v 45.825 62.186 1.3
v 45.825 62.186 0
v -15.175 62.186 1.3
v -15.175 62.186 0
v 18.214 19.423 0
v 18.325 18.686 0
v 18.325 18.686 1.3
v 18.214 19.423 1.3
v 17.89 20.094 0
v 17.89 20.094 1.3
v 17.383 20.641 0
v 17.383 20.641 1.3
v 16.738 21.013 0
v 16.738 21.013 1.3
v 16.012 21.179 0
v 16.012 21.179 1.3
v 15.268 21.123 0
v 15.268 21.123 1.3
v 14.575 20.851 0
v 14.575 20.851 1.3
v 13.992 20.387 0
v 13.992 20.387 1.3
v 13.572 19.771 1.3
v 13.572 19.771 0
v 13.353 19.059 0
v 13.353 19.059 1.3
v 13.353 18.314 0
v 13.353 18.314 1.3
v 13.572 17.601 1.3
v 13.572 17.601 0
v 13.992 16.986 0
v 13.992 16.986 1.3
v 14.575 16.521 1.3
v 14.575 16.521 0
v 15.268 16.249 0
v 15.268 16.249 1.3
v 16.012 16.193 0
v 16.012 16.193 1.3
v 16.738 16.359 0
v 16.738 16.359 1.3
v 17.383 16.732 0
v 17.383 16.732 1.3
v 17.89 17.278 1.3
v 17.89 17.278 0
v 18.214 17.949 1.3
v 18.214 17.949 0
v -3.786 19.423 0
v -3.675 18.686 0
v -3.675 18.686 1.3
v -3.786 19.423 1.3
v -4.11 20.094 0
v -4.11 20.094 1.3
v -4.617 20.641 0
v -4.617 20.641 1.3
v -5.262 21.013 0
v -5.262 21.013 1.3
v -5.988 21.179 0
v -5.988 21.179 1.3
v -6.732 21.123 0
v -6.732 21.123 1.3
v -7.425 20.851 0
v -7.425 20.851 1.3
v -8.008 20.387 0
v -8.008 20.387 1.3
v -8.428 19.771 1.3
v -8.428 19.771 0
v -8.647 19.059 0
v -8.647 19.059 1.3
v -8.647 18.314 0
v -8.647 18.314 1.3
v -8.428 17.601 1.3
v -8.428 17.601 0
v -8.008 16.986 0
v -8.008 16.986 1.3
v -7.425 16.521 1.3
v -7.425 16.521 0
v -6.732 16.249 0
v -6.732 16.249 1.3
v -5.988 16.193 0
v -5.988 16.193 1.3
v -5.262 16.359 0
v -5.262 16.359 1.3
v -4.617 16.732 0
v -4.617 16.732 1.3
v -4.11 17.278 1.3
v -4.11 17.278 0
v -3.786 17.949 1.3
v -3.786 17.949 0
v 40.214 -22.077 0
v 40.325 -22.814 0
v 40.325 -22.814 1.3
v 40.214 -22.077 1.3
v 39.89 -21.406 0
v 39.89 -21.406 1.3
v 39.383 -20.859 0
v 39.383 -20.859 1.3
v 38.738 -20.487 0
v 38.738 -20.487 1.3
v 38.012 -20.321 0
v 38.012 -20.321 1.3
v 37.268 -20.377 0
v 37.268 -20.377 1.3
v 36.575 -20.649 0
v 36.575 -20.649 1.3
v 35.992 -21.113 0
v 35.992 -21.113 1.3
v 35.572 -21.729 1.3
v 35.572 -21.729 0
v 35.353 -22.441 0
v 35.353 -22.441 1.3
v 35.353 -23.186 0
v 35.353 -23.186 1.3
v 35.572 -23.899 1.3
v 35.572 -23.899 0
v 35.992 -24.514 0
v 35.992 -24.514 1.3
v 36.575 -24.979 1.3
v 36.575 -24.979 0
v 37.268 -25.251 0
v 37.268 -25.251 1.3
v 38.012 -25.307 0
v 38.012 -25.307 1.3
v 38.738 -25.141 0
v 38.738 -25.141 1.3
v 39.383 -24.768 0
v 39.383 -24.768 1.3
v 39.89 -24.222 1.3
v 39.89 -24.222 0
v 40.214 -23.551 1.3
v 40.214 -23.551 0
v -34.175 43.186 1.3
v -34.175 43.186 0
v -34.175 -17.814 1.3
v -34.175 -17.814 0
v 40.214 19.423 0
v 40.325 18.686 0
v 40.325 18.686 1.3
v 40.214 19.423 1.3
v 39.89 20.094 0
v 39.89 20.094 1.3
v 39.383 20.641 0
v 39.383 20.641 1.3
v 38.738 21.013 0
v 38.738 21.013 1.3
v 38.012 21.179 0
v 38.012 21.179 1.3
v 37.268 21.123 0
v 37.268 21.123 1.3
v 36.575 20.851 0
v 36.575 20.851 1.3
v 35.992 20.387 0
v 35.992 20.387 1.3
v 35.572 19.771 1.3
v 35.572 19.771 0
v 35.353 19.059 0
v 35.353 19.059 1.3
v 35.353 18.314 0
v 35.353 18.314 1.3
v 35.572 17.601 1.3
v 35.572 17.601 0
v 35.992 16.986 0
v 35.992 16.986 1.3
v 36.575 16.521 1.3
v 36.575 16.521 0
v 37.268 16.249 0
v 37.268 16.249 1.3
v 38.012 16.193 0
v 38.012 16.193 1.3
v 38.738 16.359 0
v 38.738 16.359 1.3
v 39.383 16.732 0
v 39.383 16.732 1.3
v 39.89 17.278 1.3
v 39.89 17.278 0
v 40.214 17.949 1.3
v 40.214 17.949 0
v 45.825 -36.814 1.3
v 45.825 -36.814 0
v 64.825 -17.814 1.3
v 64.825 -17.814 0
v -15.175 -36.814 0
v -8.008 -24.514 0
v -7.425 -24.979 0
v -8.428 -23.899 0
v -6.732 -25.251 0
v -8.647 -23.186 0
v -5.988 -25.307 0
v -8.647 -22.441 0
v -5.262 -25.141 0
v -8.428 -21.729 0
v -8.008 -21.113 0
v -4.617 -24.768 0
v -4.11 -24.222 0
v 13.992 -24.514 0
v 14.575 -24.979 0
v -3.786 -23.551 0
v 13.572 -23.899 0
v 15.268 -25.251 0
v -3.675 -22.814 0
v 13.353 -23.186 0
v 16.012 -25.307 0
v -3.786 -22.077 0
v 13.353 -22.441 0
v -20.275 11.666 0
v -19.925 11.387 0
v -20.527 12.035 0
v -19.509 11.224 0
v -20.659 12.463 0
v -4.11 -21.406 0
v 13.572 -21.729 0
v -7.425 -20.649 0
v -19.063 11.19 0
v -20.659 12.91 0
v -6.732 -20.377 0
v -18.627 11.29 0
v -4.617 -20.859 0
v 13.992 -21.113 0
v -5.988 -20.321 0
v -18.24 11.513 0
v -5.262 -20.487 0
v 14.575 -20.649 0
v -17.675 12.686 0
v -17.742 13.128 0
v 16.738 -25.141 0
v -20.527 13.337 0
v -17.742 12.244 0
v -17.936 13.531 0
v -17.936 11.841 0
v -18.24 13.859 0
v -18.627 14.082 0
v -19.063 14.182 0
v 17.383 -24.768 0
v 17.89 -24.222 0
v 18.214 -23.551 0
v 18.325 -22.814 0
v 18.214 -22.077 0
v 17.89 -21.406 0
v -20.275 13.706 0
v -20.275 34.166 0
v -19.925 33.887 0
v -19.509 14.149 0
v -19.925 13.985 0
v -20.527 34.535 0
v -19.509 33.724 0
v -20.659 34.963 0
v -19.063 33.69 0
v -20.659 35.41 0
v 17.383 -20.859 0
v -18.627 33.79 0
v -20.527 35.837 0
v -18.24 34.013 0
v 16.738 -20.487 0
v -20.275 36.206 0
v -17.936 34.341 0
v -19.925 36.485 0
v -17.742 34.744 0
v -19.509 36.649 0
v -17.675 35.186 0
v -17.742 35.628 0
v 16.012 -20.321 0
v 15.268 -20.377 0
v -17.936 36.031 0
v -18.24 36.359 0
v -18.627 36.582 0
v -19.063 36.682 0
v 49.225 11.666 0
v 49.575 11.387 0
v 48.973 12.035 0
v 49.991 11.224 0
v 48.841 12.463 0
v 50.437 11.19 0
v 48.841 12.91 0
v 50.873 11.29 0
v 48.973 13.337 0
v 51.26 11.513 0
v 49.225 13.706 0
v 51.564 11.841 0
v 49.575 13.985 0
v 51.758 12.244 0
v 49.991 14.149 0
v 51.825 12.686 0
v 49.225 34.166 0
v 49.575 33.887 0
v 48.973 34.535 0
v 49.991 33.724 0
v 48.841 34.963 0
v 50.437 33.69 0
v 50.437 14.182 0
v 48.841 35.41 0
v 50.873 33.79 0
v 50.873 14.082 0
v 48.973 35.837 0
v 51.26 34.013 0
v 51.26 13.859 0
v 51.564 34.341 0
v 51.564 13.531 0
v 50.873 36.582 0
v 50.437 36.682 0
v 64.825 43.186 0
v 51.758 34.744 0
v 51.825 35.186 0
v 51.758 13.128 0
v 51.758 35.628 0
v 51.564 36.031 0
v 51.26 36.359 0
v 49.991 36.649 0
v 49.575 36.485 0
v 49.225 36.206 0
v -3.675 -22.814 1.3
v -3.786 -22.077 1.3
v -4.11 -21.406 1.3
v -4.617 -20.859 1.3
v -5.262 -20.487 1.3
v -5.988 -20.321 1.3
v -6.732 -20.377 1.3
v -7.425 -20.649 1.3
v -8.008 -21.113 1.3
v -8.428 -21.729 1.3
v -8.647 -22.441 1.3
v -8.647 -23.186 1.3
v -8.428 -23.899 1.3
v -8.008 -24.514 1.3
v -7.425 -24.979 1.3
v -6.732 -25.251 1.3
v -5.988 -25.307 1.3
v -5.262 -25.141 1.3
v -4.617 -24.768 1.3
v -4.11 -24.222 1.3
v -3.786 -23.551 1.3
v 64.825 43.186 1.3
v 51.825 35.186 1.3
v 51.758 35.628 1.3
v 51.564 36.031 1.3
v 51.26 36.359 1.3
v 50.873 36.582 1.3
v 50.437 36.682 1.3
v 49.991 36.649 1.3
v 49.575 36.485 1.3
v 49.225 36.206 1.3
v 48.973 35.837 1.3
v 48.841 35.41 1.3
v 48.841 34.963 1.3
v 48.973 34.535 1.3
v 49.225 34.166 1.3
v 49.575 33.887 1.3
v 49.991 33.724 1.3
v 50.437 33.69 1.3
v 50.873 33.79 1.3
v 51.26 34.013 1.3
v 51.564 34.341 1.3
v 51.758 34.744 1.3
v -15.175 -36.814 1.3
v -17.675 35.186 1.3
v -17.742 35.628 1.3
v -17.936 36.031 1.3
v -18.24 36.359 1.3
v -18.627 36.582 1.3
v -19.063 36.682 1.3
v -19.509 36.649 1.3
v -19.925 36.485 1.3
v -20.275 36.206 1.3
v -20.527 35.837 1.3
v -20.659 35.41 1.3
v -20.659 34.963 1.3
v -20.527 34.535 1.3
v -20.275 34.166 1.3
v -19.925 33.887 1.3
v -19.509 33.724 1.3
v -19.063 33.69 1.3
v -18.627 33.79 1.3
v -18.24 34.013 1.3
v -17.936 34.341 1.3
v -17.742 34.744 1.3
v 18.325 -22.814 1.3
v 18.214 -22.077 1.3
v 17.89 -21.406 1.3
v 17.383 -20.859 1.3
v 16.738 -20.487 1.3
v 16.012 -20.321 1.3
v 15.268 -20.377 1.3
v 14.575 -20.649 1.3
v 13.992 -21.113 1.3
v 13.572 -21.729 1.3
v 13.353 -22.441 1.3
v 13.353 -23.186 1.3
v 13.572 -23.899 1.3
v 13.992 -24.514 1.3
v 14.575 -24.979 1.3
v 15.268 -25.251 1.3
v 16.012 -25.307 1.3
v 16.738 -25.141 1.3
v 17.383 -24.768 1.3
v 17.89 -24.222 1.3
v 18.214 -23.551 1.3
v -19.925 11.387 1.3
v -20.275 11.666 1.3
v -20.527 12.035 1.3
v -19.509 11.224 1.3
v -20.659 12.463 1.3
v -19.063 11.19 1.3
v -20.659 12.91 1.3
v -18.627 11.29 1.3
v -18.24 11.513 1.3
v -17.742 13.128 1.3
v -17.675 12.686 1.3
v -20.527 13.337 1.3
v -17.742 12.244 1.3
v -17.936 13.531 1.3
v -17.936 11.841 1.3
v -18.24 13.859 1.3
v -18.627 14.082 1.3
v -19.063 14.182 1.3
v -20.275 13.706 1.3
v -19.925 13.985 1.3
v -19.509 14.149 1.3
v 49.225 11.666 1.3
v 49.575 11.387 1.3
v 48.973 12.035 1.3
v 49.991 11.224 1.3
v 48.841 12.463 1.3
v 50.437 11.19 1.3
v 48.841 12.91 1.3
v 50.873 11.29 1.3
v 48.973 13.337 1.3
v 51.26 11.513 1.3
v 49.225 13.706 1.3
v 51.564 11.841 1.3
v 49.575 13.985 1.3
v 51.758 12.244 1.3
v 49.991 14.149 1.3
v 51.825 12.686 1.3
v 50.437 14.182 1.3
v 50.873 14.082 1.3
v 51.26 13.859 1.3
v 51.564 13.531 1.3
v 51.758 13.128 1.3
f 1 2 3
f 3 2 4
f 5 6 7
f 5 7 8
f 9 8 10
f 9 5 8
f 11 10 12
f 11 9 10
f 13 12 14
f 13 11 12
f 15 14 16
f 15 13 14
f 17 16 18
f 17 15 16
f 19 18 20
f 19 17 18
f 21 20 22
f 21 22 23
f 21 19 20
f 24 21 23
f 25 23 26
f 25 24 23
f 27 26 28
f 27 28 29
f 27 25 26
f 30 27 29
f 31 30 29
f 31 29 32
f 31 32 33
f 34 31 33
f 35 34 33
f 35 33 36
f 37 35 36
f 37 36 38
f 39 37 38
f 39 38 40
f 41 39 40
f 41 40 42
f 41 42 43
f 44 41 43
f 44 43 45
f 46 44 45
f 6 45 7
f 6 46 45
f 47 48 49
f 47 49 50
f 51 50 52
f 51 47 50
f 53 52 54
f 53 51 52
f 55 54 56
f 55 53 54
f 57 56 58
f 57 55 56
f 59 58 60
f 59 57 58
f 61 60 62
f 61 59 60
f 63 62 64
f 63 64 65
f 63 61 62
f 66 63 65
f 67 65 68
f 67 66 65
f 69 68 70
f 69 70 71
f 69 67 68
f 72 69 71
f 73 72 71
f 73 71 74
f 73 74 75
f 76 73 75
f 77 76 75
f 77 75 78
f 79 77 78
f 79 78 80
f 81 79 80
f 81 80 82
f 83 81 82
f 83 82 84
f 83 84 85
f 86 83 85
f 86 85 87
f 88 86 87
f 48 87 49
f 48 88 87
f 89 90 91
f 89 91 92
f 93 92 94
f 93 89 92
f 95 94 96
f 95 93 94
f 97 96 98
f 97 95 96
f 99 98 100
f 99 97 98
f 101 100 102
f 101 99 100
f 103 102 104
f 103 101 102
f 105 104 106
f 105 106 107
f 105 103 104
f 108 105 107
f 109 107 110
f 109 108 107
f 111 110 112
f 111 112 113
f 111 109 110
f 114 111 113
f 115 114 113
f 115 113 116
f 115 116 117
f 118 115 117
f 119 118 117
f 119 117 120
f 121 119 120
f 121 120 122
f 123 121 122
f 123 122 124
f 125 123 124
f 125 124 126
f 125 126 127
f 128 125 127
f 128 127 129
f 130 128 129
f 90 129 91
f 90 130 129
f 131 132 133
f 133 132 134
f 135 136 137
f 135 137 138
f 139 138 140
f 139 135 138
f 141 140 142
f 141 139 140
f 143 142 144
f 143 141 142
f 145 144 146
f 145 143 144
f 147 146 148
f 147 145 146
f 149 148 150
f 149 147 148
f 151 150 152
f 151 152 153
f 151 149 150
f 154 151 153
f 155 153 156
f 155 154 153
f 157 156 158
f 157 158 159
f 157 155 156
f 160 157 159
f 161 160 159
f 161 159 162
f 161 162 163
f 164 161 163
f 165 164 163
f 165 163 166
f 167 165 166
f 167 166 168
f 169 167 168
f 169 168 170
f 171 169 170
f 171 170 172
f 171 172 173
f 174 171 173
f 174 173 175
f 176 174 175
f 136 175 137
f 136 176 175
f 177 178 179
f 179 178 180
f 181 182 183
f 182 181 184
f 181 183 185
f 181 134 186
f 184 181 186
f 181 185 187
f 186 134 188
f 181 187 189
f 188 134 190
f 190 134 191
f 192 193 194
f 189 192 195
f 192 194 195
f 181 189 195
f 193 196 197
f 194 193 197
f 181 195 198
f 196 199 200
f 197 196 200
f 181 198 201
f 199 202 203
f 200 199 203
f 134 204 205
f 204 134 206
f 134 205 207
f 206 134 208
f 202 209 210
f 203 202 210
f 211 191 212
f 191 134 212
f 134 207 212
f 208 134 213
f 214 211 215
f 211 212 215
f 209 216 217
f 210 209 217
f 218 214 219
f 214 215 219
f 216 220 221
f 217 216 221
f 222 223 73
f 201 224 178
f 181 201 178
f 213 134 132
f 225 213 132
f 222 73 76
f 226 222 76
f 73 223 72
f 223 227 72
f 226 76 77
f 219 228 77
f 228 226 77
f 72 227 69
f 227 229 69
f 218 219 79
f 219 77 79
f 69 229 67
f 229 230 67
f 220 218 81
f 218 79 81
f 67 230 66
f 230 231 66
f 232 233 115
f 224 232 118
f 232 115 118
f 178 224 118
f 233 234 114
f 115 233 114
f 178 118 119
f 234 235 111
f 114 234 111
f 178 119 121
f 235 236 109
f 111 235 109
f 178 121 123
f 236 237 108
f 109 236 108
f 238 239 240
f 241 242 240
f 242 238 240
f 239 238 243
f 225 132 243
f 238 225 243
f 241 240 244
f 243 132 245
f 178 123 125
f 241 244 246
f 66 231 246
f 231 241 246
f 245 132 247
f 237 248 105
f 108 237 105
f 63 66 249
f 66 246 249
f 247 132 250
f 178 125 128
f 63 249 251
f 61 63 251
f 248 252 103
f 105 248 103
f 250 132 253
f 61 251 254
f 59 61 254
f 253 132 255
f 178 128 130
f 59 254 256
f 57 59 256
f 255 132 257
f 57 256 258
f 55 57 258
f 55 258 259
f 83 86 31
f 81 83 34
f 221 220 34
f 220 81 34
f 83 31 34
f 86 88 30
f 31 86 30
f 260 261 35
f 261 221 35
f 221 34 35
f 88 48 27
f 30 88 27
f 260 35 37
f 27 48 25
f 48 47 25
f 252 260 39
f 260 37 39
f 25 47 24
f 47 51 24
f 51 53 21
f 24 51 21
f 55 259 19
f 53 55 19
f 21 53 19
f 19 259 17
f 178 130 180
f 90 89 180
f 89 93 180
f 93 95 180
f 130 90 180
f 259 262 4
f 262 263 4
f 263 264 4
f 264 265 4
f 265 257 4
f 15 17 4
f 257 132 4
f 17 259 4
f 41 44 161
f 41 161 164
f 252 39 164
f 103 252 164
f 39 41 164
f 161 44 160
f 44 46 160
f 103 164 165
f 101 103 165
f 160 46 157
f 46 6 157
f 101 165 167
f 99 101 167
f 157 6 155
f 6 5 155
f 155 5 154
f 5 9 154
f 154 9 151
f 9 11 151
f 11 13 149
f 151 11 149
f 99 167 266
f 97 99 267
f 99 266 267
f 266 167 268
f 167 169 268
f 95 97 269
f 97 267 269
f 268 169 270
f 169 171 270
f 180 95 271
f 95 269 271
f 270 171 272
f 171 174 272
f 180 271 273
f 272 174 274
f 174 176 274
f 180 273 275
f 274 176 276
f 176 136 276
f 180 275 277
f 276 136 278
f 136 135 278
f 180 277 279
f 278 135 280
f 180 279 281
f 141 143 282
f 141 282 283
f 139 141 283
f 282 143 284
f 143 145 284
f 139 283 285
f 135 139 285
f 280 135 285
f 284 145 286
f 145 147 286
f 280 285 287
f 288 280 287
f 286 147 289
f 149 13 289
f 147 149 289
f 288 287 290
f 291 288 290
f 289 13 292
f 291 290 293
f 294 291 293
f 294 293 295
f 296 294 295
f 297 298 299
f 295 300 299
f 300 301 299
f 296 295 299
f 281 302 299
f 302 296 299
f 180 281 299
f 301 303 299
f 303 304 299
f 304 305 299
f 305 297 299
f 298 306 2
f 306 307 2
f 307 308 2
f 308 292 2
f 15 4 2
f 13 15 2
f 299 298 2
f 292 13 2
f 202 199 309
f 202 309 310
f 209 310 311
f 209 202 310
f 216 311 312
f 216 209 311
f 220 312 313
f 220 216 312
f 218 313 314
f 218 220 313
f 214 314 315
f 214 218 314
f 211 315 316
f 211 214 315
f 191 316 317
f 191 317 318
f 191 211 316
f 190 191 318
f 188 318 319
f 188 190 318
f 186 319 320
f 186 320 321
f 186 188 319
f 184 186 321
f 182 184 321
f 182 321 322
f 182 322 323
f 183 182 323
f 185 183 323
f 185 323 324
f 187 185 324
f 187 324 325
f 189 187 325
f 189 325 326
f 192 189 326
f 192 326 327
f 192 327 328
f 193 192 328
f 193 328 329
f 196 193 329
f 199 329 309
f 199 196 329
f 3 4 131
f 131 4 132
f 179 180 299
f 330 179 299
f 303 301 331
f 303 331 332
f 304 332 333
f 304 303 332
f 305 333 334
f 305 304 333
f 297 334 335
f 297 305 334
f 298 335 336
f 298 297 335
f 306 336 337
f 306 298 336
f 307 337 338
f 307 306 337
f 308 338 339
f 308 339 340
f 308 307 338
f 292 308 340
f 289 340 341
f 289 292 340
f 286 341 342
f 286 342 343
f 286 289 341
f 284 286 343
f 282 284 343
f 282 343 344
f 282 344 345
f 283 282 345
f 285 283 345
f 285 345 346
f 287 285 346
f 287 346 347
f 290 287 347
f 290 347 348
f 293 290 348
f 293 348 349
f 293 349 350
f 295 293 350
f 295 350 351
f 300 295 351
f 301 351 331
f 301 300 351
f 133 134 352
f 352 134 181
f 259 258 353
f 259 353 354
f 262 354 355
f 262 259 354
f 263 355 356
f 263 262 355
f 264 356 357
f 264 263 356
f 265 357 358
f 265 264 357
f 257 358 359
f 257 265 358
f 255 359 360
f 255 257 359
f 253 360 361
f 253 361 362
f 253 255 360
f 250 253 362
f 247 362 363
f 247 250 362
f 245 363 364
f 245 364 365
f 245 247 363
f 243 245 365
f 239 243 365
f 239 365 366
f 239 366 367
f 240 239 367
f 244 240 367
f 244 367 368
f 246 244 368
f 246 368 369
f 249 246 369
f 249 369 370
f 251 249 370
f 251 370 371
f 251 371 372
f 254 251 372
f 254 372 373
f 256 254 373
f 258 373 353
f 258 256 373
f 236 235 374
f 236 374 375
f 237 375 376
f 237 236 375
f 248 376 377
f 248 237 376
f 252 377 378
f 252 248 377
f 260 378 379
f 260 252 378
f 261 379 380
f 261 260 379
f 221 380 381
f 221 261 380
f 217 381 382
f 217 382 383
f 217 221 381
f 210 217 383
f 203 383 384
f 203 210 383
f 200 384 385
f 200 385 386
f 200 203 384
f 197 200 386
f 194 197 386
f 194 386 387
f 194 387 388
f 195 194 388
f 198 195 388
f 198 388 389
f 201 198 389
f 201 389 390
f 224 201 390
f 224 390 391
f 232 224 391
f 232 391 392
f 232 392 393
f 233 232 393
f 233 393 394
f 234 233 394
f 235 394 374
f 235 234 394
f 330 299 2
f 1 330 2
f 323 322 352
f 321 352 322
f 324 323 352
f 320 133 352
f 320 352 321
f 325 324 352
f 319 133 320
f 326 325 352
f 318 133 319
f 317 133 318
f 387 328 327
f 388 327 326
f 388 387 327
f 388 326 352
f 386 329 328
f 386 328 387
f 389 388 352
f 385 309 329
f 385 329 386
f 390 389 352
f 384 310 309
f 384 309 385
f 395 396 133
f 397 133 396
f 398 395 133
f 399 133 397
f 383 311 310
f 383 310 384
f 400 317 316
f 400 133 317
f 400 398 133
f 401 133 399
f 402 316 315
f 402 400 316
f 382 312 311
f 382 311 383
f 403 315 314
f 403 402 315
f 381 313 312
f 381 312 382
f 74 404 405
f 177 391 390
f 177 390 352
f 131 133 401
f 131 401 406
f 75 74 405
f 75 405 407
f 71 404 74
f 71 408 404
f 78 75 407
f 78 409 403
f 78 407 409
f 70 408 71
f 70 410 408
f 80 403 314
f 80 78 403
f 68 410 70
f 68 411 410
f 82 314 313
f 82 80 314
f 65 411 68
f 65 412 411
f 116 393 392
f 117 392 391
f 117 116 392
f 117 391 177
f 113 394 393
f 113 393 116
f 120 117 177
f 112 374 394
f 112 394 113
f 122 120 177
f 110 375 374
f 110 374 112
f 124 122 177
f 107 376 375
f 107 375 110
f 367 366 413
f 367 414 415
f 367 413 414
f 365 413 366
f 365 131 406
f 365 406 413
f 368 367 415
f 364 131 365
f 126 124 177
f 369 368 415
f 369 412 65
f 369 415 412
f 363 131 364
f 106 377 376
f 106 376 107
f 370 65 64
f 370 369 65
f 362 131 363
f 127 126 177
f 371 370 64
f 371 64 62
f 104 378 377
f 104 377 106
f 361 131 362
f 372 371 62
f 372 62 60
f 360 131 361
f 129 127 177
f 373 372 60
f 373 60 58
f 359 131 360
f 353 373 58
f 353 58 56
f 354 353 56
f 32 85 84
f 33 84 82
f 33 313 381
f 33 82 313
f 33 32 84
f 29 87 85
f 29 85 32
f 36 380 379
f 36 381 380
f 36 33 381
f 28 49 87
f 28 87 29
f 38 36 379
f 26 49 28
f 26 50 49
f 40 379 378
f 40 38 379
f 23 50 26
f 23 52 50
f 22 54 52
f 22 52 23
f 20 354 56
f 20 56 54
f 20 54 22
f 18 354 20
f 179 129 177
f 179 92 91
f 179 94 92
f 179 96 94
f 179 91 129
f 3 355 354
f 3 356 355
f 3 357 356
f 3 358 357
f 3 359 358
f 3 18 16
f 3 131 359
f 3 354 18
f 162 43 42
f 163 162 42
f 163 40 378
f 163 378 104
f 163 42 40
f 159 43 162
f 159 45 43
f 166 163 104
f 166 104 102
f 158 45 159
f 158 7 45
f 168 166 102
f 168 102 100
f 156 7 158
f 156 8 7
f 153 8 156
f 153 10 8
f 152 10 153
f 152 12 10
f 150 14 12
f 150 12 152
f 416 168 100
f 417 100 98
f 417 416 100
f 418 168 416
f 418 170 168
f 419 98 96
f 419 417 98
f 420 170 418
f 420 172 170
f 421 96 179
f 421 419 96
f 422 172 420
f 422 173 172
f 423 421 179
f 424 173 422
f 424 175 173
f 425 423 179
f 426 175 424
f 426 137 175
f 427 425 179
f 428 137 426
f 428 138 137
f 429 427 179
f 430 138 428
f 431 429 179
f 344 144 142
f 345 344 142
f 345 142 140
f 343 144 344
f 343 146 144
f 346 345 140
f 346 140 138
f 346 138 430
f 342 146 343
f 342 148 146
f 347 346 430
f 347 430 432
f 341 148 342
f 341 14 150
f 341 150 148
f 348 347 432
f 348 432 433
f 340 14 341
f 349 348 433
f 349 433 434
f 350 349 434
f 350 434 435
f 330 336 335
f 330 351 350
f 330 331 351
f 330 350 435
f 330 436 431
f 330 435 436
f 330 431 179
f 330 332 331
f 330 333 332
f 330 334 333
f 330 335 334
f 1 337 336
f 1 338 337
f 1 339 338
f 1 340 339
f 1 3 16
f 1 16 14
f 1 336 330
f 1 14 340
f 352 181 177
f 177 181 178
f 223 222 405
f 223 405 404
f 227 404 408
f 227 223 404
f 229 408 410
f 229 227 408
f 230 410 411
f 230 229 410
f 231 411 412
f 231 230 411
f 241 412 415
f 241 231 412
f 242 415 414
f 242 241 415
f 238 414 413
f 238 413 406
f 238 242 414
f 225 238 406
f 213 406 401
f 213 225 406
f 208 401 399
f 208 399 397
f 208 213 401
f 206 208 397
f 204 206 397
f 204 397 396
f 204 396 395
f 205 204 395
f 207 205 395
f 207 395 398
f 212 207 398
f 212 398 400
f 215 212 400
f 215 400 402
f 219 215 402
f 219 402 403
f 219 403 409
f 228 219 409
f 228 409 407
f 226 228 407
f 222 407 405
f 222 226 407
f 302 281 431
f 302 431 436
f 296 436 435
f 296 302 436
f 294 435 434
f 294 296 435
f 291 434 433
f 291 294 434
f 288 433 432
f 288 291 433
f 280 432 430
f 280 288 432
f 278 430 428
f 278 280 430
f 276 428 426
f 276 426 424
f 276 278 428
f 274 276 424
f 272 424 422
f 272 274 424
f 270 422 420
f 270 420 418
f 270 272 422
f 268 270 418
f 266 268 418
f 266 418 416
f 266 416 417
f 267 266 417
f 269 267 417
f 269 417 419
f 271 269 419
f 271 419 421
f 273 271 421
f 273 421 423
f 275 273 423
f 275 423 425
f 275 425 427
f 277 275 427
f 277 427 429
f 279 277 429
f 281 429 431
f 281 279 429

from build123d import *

# Parameters (mm, degrees)
SKETCH1_R           = 2.5
SKETCH1_R_2         = 1.5
BOSS_EXTRUDE1_DEPTH = 1.3


with BuildPart() as part:
    # Sketch1 → Boss-Extrude1 (new body)
    with BuildSketch(Plane.XY):
        Polygon((-34.175323676, 43.186140305), (-34.175323676, -17.813859695), (-15.175323676, -36.813859695), (45.824676324, -36.813859695), (64.824676324, -17.813859695), (64.824676324, 43.186140305), (45.824676324, 62.186140305), (-15.175323676, 62.186140305), align=None)
        with Locations((-6.175323676, 18.686140305)):
            Circle(SKETCH1_R, mode=Mode.SUBTRACT)
        with Locations((15.824676324, 18.686140305)):
            Circle(SKETCH1_R, mode=Mode.SUBTRACT)
        with Locations((37.824676324, 18.686140305)):
            Circle(SKETCH1_R, mode=Mode.SUBTRACT)
        with Locations((15.824676324, -22.813859695)):
            Circle(SKETCH1_R, mode=Mode.SUBTRACT)
        with Locations((37.824676324, -22.813859695)):
            Circle(SKETCH1_R, mode=Mode.SUBTRACT)
        with Locations((-6.175323676, -22.813859695)):
            Circle(SKETCH1_R, mode=Mode.SUBTRACT)
        with Locations((-19.175323676, 12.686140305)):
            Circle(SKETCH1_R_2, mode=Mode.SUBTRACT)
        with Locations((-19.175323676, 35.186140305)):
            Circle(SKETCH1_R_2, mode=Mode.SUBTRACT)
        with Locations((50.324676324, 35.186140305)):
            Circle(SKETCH1_R_2, mode=Mode.SUBTRACT)
        with Locations((50.324676324, 12.686140305)):
            Circle(SKETCH1_R_2, mode=Mode.SUBTRACT)
    extrude(amount=BOSS_EXTRUDE1_DEPTH)


solid = part.part
